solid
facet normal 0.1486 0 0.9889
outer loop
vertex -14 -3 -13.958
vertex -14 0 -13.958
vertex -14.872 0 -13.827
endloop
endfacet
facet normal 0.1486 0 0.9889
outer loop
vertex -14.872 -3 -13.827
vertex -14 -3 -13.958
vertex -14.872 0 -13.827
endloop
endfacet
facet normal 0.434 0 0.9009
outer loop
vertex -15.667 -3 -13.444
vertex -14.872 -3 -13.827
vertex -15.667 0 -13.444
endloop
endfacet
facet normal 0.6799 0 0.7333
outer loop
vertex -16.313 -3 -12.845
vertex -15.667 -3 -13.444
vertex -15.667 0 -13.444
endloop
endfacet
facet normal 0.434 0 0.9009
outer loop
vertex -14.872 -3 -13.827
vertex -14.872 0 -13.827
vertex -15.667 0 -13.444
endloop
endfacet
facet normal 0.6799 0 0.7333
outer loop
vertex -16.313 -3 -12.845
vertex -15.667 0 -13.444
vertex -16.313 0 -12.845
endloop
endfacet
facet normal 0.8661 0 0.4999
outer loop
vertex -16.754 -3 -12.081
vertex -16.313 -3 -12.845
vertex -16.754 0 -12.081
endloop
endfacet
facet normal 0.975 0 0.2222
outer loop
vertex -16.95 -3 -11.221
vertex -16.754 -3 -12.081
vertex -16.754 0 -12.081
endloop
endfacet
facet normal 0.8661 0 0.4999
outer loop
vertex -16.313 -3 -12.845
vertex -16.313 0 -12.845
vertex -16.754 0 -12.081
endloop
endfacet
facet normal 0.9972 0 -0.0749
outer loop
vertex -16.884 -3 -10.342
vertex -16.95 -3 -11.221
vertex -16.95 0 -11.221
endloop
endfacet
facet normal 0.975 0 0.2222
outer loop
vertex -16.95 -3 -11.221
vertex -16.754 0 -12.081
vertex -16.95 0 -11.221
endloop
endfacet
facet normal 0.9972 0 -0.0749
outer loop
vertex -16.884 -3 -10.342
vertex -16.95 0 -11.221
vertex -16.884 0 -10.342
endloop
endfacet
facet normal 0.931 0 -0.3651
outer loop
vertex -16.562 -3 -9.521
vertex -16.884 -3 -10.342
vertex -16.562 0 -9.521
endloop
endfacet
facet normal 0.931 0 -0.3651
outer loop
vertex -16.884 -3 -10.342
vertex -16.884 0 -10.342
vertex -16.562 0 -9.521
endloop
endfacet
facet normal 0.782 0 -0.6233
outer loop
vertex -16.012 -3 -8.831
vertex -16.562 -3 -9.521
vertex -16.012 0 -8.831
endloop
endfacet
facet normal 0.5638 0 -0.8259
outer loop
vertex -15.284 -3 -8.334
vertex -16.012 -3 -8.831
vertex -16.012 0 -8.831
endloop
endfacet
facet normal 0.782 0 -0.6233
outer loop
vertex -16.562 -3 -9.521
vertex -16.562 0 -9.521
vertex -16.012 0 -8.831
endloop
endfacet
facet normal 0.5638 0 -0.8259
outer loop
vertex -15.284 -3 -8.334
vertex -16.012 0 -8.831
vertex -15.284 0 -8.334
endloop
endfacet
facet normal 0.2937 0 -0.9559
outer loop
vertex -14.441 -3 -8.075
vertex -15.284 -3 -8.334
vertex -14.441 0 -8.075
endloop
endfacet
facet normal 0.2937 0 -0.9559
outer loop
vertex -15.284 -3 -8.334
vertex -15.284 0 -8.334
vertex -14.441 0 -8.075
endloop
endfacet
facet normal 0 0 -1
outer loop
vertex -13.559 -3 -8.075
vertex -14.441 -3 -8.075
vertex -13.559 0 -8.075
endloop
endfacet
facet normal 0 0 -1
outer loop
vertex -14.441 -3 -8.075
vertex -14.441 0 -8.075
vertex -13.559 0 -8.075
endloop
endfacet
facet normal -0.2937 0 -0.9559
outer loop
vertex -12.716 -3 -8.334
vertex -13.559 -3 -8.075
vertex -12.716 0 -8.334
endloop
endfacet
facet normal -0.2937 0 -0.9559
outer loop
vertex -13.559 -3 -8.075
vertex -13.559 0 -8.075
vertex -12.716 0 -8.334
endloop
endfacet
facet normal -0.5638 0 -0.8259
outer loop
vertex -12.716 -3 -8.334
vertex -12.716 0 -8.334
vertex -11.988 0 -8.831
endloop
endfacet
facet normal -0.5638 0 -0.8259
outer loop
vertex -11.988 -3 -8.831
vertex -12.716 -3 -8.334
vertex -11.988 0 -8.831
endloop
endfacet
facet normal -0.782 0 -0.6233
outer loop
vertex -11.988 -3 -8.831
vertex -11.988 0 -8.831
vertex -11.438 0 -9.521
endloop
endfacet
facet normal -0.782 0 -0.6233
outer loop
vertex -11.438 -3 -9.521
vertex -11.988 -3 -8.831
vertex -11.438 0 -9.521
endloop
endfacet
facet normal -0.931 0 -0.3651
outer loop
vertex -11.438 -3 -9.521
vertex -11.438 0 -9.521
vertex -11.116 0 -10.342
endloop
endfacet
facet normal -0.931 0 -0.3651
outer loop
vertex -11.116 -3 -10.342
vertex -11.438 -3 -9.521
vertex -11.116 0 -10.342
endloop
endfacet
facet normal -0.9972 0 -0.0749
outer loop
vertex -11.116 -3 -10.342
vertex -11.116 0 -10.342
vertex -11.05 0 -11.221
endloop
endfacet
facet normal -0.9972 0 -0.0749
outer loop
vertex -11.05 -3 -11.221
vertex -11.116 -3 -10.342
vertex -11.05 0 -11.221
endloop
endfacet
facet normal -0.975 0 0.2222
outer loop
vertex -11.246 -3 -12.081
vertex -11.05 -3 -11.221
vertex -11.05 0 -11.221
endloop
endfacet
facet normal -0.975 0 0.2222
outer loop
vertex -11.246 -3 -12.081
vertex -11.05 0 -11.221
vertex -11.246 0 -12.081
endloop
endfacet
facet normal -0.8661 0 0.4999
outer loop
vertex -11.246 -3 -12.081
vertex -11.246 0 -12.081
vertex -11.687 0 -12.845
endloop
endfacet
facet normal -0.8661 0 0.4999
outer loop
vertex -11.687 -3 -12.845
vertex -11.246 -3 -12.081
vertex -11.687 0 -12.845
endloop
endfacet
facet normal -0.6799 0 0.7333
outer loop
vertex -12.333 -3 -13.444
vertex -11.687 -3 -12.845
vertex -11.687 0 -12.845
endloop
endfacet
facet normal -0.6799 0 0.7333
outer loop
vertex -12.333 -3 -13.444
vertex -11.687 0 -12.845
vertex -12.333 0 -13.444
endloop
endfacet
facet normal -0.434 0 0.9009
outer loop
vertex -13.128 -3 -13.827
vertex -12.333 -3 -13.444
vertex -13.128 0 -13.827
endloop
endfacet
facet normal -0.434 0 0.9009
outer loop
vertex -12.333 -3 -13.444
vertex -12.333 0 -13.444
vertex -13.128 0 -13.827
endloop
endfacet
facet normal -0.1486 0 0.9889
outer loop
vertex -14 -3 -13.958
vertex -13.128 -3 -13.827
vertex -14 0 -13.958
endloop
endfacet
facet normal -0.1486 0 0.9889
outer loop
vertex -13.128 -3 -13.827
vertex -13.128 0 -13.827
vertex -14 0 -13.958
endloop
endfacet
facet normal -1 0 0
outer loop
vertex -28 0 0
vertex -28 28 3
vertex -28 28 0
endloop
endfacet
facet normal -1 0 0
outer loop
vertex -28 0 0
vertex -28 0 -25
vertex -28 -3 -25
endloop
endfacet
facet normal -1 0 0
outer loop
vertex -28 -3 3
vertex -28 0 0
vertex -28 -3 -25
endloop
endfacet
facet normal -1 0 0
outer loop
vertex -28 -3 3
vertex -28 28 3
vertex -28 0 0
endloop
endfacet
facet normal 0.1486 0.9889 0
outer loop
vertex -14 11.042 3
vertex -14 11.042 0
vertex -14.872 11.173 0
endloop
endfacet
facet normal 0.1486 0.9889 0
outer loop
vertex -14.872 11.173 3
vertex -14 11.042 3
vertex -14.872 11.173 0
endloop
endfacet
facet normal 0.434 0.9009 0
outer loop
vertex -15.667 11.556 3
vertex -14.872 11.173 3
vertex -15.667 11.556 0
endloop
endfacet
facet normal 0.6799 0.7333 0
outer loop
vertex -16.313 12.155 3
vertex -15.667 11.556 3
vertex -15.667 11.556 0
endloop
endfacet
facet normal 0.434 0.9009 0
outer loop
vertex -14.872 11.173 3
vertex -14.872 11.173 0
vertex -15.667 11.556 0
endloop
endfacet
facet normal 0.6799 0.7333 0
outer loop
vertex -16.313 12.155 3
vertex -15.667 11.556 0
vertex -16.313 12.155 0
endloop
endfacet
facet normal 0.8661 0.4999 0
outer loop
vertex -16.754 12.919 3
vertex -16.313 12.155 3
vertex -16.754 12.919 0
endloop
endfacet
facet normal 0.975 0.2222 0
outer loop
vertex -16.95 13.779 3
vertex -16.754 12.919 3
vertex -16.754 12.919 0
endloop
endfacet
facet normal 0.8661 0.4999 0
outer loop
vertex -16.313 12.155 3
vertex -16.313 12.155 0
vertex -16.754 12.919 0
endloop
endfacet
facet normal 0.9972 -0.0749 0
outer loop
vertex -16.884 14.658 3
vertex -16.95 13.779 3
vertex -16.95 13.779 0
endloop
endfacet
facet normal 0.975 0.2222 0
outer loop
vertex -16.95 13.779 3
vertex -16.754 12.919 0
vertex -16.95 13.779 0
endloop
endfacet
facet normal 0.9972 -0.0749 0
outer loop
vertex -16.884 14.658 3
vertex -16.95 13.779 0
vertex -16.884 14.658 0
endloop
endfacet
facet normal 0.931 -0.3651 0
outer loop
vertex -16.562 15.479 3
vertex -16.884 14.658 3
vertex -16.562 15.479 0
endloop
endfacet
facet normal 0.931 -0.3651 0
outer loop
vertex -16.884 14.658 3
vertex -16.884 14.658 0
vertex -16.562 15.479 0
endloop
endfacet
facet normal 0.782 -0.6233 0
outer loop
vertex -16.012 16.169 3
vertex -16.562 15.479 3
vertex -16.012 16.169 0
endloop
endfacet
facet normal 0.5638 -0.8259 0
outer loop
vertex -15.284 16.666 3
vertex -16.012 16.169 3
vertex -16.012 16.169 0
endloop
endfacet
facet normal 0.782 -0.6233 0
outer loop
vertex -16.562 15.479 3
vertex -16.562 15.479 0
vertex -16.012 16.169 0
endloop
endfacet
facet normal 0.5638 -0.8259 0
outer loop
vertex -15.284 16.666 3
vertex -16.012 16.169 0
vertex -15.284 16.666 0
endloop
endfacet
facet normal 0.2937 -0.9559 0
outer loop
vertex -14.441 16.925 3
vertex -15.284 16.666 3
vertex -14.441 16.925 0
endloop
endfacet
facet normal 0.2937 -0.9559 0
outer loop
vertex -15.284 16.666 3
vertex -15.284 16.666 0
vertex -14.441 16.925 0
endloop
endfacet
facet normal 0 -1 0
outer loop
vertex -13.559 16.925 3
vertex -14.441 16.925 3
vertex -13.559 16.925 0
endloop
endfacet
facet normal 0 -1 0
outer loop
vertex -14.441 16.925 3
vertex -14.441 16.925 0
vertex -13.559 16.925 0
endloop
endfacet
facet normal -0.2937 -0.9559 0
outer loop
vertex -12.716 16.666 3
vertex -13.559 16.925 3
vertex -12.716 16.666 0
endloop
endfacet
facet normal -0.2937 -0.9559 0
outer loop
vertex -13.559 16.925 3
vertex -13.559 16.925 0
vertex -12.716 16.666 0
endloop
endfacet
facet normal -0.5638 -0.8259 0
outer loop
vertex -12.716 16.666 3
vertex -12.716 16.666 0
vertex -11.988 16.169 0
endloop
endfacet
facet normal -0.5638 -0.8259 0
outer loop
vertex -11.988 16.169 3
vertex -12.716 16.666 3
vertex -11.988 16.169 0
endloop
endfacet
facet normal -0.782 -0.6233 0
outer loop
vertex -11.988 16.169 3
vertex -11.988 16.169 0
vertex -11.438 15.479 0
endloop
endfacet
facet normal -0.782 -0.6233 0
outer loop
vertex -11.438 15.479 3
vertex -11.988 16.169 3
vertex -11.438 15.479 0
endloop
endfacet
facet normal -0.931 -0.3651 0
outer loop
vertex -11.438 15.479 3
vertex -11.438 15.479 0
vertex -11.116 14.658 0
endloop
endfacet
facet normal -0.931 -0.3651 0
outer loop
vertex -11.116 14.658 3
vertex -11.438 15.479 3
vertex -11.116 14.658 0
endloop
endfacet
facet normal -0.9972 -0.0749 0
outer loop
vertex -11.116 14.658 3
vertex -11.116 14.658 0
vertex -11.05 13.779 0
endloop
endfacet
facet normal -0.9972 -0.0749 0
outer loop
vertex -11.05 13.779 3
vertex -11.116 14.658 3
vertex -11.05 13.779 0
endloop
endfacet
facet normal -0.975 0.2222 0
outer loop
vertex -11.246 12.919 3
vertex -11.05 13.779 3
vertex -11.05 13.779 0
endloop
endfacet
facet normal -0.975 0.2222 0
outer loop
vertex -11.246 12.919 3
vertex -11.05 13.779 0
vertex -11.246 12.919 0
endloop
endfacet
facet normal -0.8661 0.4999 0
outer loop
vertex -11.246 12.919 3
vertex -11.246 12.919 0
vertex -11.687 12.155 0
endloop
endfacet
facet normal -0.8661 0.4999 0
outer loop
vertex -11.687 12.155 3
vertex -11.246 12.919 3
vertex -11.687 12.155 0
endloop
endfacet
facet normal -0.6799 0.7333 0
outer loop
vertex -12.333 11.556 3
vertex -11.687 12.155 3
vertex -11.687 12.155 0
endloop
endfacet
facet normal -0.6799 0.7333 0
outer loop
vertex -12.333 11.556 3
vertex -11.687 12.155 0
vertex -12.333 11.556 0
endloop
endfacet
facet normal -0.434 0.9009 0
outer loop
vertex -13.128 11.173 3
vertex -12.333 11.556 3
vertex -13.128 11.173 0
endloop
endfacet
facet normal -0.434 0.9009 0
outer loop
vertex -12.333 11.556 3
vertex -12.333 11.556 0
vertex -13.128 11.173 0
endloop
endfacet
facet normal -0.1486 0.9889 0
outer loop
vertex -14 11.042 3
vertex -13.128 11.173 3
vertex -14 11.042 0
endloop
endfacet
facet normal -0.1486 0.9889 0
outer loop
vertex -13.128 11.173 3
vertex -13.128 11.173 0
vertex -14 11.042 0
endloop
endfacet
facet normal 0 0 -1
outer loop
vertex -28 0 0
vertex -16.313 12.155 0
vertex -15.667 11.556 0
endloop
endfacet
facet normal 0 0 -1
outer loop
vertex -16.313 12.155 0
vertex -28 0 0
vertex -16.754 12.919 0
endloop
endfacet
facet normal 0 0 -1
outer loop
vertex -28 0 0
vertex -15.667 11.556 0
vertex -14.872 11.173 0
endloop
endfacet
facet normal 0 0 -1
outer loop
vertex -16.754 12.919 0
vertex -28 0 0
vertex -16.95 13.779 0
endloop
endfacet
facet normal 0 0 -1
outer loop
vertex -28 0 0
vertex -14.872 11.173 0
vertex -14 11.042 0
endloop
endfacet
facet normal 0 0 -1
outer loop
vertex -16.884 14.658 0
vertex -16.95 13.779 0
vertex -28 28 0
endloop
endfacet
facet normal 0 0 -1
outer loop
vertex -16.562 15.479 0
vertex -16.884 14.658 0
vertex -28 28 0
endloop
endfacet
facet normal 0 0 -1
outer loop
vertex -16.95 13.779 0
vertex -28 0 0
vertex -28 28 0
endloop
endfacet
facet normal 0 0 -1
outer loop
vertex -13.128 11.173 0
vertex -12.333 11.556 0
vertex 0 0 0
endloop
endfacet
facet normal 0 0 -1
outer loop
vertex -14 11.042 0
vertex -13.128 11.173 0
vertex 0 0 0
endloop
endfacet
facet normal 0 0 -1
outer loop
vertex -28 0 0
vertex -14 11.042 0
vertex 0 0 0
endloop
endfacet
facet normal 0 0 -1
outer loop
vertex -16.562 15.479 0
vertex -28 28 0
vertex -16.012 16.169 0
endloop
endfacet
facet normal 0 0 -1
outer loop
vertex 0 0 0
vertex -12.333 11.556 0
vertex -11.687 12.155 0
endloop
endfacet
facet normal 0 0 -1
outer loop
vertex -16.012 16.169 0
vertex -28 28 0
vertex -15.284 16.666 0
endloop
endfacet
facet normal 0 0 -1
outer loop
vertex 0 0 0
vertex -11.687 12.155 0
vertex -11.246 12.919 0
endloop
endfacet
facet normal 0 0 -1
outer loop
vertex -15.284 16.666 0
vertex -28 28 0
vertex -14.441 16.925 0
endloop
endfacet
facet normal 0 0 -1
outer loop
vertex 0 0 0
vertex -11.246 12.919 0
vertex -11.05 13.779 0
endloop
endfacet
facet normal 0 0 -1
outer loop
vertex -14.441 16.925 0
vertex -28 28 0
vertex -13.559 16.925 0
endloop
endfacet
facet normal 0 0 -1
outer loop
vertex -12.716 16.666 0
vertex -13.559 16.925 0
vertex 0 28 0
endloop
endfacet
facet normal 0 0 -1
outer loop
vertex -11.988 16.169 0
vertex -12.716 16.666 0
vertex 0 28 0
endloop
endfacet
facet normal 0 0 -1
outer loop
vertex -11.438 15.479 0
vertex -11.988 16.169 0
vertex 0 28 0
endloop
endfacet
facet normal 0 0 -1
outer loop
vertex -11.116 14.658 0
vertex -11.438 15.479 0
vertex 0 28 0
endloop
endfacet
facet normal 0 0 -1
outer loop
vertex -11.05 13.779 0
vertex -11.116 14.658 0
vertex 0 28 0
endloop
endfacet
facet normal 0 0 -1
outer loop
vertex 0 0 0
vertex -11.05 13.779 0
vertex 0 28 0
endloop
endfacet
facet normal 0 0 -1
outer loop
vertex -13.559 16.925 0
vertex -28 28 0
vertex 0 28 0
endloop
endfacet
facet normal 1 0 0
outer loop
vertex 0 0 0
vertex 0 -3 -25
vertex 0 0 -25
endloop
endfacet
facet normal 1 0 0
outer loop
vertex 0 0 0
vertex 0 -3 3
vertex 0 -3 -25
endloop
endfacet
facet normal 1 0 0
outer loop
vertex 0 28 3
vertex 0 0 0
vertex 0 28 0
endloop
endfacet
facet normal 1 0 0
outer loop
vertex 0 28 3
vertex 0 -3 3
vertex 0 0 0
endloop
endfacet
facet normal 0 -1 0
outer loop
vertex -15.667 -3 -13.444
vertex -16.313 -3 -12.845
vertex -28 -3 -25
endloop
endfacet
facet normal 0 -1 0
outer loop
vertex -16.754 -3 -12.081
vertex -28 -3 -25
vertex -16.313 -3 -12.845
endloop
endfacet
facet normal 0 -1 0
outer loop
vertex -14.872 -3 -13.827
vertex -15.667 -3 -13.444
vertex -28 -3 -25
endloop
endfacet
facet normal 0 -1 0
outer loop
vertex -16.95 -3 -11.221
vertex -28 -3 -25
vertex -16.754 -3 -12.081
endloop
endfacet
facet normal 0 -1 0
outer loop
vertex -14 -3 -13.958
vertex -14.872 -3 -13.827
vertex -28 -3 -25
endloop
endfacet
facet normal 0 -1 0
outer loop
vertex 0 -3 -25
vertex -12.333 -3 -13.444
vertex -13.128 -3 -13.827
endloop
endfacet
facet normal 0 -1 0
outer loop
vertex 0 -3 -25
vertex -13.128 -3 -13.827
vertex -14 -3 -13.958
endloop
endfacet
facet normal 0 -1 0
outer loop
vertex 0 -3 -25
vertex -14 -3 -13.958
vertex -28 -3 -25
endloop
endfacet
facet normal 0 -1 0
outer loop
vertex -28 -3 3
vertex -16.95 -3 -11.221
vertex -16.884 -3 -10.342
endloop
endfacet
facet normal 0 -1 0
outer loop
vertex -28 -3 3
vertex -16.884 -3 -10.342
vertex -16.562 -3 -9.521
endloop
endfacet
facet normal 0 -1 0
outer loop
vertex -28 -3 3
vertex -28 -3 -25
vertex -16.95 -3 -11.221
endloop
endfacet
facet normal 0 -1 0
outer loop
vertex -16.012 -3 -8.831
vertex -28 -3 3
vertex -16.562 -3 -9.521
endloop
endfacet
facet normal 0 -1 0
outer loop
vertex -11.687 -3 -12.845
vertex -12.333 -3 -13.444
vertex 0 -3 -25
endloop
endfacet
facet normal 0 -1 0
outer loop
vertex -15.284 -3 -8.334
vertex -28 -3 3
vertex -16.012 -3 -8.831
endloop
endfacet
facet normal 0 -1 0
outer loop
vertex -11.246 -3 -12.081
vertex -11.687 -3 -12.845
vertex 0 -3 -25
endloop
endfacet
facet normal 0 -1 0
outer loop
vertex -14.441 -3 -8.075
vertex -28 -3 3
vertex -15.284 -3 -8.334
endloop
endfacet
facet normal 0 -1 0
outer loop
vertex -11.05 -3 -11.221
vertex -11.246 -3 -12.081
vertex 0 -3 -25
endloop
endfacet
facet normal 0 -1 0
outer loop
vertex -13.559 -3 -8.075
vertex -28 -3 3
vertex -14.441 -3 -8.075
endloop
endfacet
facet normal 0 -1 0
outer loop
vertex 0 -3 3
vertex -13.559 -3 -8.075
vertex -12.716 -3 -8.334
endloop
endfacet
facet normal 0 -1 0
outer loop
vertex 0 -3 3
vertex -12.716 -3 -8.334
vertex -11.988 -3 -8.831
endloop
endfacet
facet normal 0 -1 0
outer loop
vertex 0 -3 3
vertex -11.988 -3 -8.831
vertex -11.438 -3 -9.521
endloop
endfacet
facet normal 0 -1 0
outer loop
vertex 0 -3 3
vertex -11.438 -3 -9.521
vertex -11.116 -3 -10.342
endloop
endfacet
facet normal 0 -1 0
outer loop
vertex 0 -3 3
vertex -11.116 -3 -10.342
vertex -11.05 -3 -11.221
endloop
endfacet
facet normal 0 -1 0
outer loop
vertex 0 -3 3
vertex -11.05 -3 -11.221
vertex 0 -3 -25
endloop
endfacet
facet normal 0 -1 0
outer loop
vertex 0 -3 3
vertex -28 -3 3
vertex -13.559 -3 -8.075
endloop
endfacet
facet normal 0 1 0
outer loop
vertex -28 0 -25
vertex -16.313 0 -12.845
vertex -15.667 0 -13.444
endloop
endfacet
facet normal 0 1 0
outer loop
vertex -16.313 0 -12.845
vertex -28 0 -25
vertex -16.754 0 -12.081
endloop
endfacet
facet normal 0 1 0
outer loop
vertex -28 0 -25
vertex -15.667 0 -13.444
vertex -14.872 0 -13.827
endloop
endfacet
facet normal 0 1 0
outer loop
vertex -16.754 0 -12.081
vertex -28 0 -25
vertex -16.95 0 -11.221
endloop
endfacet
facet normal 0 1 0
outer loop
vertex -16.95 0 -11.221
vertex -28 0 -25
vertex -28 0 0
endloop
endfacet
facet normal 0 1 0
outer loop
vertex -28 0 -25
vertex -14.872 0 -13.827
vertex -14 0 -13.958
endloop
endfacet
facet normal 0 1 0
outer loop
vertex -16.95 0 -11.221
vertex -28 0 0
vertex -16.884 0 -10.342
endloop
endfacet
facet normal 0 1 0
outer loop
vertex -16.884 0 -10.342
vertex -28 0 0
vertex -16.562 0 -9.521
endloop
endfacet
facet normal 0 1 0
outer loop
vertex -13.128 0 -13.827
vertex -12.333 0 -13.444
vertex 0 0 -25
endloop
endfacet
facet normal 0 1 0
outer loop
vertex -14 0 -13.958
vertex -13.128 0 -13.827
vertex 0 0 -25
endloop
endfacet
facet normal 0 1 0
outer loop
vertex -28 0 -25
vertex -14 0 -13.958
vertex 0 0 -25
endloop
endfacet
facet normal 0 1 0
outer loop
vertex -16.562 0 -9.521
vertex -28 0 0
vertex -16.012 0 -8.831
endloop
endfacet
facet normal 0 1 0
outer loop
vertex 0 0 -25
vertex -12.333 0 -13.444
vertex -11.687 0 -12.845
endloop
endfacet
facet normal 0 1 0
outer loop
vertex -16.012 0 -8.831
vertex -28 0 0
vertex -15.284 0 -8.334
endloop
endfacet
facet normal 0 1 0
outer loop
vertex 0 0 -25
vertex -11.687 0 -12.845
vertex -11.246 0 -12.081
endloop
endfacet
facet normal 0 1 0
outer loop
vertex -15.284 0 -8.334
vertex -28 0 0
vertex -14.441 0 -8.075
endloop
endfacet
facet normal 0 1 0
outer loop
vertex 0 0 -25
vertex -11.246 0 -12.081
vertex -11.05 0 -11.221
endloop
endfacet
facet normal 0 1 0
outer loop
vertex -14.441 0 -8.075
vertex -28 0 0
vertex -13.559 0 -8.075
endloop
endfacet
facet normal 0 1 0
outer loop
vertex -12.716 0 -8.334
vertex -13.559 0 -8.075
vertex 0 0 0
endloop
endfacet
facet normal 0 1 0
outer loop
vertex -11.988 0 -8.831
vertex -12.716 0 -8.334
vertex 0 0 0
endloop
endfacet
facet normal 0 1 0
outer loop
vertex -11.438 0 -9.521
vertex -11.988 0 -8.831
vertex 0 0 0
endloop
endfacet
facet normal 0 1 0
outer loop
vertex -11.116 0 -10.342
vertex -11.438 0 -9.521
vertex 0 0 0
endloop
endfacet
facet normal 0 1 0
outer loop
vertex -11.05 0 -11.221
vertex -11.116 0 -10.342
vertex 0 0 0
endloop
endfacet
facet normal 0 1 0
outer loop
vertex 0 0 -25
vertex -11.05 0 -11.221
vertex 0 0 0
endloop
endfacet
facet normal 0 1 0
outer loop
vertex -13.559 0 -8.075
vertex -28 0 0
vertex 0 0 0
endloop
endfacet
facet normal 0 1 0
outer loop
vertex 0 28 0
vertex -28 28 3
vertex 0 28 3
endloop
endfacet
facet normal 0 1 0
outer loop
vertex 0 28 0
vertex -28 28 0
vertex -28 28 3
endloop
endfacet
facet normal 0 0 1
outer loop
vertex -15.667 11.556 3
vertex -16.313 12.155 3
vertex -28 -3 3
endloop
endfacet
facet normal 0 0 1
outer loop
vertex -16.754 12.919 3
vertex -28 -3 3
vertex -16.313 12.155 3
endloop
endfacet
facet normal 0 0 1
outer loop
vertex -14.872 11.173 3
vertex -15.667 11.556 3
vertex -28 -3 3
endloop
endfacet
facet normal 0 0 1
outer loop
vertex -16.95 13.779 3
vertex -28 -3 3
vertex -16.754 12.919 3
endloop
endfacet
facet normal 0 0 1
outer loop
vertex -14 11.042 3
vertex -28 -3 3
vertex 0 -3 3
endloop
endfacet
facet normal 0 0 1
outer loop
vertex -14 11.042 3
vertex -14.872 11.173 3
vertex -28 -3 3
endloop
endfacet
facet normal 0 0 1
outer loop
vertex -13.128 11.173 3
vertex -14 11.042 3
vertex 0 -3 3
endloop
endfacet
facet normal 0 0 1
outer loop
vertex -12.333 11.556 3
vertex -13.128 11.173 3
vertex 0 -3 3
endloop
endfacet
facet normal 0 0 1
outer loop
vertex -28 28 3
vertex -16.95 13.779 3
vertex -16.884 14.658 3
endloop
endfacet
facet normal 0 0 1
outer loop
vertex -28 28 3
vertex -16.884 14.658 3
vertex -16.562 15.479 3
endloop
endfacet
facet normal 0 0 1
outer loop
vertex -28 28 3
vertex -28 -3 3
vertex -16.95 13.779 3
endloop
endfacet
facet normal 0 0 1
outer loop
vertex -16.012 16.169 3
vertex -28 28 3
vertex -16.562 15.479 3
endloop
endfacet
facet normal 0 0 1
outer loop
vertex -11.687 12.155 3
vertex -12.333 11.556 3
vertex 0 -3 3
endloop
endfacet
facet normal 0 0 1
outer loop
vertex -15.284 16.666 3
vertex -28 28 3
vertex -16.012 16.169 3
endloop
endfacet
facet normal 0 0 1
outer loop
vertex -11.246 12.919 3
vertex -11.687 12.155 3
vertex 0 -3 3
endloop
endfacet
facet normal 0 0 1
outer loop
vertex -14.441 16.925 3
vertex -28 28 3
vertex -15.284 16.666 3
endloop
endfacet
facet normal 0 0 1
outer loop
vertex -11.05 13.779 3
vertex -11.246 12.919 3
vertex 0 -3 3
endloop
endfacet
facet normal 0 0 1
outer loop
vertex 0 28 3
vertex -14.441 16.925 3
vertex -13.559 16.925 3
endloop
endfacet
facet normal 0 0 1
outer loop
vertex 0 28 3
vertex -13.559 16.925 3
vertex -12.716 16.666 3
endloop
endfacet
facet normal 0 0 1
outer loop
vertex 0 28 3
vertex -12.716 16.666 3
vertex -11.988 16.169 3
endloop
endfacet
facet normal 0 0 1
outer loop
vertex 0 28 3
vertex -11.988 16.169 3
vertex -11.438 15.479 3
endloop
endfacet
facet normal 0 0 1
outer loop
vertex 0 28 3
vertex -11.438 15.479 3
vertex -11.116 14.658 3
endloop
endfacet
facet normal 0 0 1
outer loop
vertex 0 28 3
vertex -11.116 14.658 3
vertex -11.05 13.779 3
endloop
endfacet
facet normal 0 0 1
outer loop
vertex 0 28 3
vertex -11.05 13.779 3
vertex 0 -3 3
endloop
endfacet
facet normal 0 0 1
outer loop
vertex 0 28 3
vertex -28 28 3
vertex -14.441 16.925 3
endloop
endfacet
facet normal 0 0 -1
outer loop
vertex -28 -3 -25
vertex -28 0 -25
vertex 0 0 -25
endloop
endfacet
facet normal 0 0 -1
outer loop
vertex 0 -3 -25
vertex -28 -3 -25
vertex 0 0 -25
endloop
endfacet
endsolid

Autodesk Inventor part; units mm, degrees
ref_plane "YZ Plane" through (0, 0, 0) normal (1, 0, 0) x (0, 1, 0)
ref_plane "XZ Plane" through (0, 0, 0) normal (0, 1, 0) x (-1, 0, 0)
ref_plane "XY Plane" through (0, 0, 0) normal (0, 0, 1) x (1, 0, 0)
sketch "Sketch1" plane through (0, 0, 0) normal (0, 0, 1) x (1, 0, 0)
  line L0 (-28, 28) -> (0, 28)
  line L1 (0, 28) -> (0, 0)
  line L2 (0, 0) -> (-28, 0)
  line L3 (-28, 0) -> (-28, 28)
  dimension "d0" = 28
  dimension "d1" = 28
extrude "Extrusion1" add sketch "Sketch1" along normal blind 3
sketch "Sketch2" plane through (0, 0, 3) normal (0, 0, 1) x (1, 0, 0)
  line L0 (0, 28) -> (-28, 28) projected
  line L1 (0, 0) -> (0, 28) projected
  point P0 (-14, 14)
  dimension "d4" = 14
  dimension "d5" = 14
hole "Hole1" at (-14, 14, 3) direction (0, 0, -1) diameter 5.917 depth 19.1 tip angle 118 thread size "M7x1" class "6H" standard "ANSI Metric M Profile"
sketch "Sketch3" plane through (0, 0, 3) normal (0, 0, 1) x (1, 0, 0)
  line L0 (-28, 0) -> (0, 0) projected
  line L1 (0, 0) -> (-28, 0)
  line L2 (-28, 0) -> (-28, -3)
  line L3 (-28, -3) -> (0, -3)
  line L4 (0, -3) -> (0, 0)
  line L5 (-28, 28) -> (-28, 0) projected
  dimension "d13" = 3
extrude "Extrusion2" add sketch "Sketch3" against normal blind 28
sketch "Sketch4" plane through (-28, -3, 3) normal (0, -1, 0) x (1, 0, 0)
  line L0 (0, 0) -> (28, 0) projected
  line L1 (28, 0) -> (28, -28) projected
  point P0 (28, -3)
  point P1 (14, -14)
  dimension "d16" = 14
  dimension "d17" = 14
hole "Hole2" at (-14, -3, -11) direction (0, 1, 0) diameter 5.917 depth 19.1 tip angle 118 thread size "M7x1" class "6H" standard "ANSI Metric M Profile"
properties part number "Esquinero"
